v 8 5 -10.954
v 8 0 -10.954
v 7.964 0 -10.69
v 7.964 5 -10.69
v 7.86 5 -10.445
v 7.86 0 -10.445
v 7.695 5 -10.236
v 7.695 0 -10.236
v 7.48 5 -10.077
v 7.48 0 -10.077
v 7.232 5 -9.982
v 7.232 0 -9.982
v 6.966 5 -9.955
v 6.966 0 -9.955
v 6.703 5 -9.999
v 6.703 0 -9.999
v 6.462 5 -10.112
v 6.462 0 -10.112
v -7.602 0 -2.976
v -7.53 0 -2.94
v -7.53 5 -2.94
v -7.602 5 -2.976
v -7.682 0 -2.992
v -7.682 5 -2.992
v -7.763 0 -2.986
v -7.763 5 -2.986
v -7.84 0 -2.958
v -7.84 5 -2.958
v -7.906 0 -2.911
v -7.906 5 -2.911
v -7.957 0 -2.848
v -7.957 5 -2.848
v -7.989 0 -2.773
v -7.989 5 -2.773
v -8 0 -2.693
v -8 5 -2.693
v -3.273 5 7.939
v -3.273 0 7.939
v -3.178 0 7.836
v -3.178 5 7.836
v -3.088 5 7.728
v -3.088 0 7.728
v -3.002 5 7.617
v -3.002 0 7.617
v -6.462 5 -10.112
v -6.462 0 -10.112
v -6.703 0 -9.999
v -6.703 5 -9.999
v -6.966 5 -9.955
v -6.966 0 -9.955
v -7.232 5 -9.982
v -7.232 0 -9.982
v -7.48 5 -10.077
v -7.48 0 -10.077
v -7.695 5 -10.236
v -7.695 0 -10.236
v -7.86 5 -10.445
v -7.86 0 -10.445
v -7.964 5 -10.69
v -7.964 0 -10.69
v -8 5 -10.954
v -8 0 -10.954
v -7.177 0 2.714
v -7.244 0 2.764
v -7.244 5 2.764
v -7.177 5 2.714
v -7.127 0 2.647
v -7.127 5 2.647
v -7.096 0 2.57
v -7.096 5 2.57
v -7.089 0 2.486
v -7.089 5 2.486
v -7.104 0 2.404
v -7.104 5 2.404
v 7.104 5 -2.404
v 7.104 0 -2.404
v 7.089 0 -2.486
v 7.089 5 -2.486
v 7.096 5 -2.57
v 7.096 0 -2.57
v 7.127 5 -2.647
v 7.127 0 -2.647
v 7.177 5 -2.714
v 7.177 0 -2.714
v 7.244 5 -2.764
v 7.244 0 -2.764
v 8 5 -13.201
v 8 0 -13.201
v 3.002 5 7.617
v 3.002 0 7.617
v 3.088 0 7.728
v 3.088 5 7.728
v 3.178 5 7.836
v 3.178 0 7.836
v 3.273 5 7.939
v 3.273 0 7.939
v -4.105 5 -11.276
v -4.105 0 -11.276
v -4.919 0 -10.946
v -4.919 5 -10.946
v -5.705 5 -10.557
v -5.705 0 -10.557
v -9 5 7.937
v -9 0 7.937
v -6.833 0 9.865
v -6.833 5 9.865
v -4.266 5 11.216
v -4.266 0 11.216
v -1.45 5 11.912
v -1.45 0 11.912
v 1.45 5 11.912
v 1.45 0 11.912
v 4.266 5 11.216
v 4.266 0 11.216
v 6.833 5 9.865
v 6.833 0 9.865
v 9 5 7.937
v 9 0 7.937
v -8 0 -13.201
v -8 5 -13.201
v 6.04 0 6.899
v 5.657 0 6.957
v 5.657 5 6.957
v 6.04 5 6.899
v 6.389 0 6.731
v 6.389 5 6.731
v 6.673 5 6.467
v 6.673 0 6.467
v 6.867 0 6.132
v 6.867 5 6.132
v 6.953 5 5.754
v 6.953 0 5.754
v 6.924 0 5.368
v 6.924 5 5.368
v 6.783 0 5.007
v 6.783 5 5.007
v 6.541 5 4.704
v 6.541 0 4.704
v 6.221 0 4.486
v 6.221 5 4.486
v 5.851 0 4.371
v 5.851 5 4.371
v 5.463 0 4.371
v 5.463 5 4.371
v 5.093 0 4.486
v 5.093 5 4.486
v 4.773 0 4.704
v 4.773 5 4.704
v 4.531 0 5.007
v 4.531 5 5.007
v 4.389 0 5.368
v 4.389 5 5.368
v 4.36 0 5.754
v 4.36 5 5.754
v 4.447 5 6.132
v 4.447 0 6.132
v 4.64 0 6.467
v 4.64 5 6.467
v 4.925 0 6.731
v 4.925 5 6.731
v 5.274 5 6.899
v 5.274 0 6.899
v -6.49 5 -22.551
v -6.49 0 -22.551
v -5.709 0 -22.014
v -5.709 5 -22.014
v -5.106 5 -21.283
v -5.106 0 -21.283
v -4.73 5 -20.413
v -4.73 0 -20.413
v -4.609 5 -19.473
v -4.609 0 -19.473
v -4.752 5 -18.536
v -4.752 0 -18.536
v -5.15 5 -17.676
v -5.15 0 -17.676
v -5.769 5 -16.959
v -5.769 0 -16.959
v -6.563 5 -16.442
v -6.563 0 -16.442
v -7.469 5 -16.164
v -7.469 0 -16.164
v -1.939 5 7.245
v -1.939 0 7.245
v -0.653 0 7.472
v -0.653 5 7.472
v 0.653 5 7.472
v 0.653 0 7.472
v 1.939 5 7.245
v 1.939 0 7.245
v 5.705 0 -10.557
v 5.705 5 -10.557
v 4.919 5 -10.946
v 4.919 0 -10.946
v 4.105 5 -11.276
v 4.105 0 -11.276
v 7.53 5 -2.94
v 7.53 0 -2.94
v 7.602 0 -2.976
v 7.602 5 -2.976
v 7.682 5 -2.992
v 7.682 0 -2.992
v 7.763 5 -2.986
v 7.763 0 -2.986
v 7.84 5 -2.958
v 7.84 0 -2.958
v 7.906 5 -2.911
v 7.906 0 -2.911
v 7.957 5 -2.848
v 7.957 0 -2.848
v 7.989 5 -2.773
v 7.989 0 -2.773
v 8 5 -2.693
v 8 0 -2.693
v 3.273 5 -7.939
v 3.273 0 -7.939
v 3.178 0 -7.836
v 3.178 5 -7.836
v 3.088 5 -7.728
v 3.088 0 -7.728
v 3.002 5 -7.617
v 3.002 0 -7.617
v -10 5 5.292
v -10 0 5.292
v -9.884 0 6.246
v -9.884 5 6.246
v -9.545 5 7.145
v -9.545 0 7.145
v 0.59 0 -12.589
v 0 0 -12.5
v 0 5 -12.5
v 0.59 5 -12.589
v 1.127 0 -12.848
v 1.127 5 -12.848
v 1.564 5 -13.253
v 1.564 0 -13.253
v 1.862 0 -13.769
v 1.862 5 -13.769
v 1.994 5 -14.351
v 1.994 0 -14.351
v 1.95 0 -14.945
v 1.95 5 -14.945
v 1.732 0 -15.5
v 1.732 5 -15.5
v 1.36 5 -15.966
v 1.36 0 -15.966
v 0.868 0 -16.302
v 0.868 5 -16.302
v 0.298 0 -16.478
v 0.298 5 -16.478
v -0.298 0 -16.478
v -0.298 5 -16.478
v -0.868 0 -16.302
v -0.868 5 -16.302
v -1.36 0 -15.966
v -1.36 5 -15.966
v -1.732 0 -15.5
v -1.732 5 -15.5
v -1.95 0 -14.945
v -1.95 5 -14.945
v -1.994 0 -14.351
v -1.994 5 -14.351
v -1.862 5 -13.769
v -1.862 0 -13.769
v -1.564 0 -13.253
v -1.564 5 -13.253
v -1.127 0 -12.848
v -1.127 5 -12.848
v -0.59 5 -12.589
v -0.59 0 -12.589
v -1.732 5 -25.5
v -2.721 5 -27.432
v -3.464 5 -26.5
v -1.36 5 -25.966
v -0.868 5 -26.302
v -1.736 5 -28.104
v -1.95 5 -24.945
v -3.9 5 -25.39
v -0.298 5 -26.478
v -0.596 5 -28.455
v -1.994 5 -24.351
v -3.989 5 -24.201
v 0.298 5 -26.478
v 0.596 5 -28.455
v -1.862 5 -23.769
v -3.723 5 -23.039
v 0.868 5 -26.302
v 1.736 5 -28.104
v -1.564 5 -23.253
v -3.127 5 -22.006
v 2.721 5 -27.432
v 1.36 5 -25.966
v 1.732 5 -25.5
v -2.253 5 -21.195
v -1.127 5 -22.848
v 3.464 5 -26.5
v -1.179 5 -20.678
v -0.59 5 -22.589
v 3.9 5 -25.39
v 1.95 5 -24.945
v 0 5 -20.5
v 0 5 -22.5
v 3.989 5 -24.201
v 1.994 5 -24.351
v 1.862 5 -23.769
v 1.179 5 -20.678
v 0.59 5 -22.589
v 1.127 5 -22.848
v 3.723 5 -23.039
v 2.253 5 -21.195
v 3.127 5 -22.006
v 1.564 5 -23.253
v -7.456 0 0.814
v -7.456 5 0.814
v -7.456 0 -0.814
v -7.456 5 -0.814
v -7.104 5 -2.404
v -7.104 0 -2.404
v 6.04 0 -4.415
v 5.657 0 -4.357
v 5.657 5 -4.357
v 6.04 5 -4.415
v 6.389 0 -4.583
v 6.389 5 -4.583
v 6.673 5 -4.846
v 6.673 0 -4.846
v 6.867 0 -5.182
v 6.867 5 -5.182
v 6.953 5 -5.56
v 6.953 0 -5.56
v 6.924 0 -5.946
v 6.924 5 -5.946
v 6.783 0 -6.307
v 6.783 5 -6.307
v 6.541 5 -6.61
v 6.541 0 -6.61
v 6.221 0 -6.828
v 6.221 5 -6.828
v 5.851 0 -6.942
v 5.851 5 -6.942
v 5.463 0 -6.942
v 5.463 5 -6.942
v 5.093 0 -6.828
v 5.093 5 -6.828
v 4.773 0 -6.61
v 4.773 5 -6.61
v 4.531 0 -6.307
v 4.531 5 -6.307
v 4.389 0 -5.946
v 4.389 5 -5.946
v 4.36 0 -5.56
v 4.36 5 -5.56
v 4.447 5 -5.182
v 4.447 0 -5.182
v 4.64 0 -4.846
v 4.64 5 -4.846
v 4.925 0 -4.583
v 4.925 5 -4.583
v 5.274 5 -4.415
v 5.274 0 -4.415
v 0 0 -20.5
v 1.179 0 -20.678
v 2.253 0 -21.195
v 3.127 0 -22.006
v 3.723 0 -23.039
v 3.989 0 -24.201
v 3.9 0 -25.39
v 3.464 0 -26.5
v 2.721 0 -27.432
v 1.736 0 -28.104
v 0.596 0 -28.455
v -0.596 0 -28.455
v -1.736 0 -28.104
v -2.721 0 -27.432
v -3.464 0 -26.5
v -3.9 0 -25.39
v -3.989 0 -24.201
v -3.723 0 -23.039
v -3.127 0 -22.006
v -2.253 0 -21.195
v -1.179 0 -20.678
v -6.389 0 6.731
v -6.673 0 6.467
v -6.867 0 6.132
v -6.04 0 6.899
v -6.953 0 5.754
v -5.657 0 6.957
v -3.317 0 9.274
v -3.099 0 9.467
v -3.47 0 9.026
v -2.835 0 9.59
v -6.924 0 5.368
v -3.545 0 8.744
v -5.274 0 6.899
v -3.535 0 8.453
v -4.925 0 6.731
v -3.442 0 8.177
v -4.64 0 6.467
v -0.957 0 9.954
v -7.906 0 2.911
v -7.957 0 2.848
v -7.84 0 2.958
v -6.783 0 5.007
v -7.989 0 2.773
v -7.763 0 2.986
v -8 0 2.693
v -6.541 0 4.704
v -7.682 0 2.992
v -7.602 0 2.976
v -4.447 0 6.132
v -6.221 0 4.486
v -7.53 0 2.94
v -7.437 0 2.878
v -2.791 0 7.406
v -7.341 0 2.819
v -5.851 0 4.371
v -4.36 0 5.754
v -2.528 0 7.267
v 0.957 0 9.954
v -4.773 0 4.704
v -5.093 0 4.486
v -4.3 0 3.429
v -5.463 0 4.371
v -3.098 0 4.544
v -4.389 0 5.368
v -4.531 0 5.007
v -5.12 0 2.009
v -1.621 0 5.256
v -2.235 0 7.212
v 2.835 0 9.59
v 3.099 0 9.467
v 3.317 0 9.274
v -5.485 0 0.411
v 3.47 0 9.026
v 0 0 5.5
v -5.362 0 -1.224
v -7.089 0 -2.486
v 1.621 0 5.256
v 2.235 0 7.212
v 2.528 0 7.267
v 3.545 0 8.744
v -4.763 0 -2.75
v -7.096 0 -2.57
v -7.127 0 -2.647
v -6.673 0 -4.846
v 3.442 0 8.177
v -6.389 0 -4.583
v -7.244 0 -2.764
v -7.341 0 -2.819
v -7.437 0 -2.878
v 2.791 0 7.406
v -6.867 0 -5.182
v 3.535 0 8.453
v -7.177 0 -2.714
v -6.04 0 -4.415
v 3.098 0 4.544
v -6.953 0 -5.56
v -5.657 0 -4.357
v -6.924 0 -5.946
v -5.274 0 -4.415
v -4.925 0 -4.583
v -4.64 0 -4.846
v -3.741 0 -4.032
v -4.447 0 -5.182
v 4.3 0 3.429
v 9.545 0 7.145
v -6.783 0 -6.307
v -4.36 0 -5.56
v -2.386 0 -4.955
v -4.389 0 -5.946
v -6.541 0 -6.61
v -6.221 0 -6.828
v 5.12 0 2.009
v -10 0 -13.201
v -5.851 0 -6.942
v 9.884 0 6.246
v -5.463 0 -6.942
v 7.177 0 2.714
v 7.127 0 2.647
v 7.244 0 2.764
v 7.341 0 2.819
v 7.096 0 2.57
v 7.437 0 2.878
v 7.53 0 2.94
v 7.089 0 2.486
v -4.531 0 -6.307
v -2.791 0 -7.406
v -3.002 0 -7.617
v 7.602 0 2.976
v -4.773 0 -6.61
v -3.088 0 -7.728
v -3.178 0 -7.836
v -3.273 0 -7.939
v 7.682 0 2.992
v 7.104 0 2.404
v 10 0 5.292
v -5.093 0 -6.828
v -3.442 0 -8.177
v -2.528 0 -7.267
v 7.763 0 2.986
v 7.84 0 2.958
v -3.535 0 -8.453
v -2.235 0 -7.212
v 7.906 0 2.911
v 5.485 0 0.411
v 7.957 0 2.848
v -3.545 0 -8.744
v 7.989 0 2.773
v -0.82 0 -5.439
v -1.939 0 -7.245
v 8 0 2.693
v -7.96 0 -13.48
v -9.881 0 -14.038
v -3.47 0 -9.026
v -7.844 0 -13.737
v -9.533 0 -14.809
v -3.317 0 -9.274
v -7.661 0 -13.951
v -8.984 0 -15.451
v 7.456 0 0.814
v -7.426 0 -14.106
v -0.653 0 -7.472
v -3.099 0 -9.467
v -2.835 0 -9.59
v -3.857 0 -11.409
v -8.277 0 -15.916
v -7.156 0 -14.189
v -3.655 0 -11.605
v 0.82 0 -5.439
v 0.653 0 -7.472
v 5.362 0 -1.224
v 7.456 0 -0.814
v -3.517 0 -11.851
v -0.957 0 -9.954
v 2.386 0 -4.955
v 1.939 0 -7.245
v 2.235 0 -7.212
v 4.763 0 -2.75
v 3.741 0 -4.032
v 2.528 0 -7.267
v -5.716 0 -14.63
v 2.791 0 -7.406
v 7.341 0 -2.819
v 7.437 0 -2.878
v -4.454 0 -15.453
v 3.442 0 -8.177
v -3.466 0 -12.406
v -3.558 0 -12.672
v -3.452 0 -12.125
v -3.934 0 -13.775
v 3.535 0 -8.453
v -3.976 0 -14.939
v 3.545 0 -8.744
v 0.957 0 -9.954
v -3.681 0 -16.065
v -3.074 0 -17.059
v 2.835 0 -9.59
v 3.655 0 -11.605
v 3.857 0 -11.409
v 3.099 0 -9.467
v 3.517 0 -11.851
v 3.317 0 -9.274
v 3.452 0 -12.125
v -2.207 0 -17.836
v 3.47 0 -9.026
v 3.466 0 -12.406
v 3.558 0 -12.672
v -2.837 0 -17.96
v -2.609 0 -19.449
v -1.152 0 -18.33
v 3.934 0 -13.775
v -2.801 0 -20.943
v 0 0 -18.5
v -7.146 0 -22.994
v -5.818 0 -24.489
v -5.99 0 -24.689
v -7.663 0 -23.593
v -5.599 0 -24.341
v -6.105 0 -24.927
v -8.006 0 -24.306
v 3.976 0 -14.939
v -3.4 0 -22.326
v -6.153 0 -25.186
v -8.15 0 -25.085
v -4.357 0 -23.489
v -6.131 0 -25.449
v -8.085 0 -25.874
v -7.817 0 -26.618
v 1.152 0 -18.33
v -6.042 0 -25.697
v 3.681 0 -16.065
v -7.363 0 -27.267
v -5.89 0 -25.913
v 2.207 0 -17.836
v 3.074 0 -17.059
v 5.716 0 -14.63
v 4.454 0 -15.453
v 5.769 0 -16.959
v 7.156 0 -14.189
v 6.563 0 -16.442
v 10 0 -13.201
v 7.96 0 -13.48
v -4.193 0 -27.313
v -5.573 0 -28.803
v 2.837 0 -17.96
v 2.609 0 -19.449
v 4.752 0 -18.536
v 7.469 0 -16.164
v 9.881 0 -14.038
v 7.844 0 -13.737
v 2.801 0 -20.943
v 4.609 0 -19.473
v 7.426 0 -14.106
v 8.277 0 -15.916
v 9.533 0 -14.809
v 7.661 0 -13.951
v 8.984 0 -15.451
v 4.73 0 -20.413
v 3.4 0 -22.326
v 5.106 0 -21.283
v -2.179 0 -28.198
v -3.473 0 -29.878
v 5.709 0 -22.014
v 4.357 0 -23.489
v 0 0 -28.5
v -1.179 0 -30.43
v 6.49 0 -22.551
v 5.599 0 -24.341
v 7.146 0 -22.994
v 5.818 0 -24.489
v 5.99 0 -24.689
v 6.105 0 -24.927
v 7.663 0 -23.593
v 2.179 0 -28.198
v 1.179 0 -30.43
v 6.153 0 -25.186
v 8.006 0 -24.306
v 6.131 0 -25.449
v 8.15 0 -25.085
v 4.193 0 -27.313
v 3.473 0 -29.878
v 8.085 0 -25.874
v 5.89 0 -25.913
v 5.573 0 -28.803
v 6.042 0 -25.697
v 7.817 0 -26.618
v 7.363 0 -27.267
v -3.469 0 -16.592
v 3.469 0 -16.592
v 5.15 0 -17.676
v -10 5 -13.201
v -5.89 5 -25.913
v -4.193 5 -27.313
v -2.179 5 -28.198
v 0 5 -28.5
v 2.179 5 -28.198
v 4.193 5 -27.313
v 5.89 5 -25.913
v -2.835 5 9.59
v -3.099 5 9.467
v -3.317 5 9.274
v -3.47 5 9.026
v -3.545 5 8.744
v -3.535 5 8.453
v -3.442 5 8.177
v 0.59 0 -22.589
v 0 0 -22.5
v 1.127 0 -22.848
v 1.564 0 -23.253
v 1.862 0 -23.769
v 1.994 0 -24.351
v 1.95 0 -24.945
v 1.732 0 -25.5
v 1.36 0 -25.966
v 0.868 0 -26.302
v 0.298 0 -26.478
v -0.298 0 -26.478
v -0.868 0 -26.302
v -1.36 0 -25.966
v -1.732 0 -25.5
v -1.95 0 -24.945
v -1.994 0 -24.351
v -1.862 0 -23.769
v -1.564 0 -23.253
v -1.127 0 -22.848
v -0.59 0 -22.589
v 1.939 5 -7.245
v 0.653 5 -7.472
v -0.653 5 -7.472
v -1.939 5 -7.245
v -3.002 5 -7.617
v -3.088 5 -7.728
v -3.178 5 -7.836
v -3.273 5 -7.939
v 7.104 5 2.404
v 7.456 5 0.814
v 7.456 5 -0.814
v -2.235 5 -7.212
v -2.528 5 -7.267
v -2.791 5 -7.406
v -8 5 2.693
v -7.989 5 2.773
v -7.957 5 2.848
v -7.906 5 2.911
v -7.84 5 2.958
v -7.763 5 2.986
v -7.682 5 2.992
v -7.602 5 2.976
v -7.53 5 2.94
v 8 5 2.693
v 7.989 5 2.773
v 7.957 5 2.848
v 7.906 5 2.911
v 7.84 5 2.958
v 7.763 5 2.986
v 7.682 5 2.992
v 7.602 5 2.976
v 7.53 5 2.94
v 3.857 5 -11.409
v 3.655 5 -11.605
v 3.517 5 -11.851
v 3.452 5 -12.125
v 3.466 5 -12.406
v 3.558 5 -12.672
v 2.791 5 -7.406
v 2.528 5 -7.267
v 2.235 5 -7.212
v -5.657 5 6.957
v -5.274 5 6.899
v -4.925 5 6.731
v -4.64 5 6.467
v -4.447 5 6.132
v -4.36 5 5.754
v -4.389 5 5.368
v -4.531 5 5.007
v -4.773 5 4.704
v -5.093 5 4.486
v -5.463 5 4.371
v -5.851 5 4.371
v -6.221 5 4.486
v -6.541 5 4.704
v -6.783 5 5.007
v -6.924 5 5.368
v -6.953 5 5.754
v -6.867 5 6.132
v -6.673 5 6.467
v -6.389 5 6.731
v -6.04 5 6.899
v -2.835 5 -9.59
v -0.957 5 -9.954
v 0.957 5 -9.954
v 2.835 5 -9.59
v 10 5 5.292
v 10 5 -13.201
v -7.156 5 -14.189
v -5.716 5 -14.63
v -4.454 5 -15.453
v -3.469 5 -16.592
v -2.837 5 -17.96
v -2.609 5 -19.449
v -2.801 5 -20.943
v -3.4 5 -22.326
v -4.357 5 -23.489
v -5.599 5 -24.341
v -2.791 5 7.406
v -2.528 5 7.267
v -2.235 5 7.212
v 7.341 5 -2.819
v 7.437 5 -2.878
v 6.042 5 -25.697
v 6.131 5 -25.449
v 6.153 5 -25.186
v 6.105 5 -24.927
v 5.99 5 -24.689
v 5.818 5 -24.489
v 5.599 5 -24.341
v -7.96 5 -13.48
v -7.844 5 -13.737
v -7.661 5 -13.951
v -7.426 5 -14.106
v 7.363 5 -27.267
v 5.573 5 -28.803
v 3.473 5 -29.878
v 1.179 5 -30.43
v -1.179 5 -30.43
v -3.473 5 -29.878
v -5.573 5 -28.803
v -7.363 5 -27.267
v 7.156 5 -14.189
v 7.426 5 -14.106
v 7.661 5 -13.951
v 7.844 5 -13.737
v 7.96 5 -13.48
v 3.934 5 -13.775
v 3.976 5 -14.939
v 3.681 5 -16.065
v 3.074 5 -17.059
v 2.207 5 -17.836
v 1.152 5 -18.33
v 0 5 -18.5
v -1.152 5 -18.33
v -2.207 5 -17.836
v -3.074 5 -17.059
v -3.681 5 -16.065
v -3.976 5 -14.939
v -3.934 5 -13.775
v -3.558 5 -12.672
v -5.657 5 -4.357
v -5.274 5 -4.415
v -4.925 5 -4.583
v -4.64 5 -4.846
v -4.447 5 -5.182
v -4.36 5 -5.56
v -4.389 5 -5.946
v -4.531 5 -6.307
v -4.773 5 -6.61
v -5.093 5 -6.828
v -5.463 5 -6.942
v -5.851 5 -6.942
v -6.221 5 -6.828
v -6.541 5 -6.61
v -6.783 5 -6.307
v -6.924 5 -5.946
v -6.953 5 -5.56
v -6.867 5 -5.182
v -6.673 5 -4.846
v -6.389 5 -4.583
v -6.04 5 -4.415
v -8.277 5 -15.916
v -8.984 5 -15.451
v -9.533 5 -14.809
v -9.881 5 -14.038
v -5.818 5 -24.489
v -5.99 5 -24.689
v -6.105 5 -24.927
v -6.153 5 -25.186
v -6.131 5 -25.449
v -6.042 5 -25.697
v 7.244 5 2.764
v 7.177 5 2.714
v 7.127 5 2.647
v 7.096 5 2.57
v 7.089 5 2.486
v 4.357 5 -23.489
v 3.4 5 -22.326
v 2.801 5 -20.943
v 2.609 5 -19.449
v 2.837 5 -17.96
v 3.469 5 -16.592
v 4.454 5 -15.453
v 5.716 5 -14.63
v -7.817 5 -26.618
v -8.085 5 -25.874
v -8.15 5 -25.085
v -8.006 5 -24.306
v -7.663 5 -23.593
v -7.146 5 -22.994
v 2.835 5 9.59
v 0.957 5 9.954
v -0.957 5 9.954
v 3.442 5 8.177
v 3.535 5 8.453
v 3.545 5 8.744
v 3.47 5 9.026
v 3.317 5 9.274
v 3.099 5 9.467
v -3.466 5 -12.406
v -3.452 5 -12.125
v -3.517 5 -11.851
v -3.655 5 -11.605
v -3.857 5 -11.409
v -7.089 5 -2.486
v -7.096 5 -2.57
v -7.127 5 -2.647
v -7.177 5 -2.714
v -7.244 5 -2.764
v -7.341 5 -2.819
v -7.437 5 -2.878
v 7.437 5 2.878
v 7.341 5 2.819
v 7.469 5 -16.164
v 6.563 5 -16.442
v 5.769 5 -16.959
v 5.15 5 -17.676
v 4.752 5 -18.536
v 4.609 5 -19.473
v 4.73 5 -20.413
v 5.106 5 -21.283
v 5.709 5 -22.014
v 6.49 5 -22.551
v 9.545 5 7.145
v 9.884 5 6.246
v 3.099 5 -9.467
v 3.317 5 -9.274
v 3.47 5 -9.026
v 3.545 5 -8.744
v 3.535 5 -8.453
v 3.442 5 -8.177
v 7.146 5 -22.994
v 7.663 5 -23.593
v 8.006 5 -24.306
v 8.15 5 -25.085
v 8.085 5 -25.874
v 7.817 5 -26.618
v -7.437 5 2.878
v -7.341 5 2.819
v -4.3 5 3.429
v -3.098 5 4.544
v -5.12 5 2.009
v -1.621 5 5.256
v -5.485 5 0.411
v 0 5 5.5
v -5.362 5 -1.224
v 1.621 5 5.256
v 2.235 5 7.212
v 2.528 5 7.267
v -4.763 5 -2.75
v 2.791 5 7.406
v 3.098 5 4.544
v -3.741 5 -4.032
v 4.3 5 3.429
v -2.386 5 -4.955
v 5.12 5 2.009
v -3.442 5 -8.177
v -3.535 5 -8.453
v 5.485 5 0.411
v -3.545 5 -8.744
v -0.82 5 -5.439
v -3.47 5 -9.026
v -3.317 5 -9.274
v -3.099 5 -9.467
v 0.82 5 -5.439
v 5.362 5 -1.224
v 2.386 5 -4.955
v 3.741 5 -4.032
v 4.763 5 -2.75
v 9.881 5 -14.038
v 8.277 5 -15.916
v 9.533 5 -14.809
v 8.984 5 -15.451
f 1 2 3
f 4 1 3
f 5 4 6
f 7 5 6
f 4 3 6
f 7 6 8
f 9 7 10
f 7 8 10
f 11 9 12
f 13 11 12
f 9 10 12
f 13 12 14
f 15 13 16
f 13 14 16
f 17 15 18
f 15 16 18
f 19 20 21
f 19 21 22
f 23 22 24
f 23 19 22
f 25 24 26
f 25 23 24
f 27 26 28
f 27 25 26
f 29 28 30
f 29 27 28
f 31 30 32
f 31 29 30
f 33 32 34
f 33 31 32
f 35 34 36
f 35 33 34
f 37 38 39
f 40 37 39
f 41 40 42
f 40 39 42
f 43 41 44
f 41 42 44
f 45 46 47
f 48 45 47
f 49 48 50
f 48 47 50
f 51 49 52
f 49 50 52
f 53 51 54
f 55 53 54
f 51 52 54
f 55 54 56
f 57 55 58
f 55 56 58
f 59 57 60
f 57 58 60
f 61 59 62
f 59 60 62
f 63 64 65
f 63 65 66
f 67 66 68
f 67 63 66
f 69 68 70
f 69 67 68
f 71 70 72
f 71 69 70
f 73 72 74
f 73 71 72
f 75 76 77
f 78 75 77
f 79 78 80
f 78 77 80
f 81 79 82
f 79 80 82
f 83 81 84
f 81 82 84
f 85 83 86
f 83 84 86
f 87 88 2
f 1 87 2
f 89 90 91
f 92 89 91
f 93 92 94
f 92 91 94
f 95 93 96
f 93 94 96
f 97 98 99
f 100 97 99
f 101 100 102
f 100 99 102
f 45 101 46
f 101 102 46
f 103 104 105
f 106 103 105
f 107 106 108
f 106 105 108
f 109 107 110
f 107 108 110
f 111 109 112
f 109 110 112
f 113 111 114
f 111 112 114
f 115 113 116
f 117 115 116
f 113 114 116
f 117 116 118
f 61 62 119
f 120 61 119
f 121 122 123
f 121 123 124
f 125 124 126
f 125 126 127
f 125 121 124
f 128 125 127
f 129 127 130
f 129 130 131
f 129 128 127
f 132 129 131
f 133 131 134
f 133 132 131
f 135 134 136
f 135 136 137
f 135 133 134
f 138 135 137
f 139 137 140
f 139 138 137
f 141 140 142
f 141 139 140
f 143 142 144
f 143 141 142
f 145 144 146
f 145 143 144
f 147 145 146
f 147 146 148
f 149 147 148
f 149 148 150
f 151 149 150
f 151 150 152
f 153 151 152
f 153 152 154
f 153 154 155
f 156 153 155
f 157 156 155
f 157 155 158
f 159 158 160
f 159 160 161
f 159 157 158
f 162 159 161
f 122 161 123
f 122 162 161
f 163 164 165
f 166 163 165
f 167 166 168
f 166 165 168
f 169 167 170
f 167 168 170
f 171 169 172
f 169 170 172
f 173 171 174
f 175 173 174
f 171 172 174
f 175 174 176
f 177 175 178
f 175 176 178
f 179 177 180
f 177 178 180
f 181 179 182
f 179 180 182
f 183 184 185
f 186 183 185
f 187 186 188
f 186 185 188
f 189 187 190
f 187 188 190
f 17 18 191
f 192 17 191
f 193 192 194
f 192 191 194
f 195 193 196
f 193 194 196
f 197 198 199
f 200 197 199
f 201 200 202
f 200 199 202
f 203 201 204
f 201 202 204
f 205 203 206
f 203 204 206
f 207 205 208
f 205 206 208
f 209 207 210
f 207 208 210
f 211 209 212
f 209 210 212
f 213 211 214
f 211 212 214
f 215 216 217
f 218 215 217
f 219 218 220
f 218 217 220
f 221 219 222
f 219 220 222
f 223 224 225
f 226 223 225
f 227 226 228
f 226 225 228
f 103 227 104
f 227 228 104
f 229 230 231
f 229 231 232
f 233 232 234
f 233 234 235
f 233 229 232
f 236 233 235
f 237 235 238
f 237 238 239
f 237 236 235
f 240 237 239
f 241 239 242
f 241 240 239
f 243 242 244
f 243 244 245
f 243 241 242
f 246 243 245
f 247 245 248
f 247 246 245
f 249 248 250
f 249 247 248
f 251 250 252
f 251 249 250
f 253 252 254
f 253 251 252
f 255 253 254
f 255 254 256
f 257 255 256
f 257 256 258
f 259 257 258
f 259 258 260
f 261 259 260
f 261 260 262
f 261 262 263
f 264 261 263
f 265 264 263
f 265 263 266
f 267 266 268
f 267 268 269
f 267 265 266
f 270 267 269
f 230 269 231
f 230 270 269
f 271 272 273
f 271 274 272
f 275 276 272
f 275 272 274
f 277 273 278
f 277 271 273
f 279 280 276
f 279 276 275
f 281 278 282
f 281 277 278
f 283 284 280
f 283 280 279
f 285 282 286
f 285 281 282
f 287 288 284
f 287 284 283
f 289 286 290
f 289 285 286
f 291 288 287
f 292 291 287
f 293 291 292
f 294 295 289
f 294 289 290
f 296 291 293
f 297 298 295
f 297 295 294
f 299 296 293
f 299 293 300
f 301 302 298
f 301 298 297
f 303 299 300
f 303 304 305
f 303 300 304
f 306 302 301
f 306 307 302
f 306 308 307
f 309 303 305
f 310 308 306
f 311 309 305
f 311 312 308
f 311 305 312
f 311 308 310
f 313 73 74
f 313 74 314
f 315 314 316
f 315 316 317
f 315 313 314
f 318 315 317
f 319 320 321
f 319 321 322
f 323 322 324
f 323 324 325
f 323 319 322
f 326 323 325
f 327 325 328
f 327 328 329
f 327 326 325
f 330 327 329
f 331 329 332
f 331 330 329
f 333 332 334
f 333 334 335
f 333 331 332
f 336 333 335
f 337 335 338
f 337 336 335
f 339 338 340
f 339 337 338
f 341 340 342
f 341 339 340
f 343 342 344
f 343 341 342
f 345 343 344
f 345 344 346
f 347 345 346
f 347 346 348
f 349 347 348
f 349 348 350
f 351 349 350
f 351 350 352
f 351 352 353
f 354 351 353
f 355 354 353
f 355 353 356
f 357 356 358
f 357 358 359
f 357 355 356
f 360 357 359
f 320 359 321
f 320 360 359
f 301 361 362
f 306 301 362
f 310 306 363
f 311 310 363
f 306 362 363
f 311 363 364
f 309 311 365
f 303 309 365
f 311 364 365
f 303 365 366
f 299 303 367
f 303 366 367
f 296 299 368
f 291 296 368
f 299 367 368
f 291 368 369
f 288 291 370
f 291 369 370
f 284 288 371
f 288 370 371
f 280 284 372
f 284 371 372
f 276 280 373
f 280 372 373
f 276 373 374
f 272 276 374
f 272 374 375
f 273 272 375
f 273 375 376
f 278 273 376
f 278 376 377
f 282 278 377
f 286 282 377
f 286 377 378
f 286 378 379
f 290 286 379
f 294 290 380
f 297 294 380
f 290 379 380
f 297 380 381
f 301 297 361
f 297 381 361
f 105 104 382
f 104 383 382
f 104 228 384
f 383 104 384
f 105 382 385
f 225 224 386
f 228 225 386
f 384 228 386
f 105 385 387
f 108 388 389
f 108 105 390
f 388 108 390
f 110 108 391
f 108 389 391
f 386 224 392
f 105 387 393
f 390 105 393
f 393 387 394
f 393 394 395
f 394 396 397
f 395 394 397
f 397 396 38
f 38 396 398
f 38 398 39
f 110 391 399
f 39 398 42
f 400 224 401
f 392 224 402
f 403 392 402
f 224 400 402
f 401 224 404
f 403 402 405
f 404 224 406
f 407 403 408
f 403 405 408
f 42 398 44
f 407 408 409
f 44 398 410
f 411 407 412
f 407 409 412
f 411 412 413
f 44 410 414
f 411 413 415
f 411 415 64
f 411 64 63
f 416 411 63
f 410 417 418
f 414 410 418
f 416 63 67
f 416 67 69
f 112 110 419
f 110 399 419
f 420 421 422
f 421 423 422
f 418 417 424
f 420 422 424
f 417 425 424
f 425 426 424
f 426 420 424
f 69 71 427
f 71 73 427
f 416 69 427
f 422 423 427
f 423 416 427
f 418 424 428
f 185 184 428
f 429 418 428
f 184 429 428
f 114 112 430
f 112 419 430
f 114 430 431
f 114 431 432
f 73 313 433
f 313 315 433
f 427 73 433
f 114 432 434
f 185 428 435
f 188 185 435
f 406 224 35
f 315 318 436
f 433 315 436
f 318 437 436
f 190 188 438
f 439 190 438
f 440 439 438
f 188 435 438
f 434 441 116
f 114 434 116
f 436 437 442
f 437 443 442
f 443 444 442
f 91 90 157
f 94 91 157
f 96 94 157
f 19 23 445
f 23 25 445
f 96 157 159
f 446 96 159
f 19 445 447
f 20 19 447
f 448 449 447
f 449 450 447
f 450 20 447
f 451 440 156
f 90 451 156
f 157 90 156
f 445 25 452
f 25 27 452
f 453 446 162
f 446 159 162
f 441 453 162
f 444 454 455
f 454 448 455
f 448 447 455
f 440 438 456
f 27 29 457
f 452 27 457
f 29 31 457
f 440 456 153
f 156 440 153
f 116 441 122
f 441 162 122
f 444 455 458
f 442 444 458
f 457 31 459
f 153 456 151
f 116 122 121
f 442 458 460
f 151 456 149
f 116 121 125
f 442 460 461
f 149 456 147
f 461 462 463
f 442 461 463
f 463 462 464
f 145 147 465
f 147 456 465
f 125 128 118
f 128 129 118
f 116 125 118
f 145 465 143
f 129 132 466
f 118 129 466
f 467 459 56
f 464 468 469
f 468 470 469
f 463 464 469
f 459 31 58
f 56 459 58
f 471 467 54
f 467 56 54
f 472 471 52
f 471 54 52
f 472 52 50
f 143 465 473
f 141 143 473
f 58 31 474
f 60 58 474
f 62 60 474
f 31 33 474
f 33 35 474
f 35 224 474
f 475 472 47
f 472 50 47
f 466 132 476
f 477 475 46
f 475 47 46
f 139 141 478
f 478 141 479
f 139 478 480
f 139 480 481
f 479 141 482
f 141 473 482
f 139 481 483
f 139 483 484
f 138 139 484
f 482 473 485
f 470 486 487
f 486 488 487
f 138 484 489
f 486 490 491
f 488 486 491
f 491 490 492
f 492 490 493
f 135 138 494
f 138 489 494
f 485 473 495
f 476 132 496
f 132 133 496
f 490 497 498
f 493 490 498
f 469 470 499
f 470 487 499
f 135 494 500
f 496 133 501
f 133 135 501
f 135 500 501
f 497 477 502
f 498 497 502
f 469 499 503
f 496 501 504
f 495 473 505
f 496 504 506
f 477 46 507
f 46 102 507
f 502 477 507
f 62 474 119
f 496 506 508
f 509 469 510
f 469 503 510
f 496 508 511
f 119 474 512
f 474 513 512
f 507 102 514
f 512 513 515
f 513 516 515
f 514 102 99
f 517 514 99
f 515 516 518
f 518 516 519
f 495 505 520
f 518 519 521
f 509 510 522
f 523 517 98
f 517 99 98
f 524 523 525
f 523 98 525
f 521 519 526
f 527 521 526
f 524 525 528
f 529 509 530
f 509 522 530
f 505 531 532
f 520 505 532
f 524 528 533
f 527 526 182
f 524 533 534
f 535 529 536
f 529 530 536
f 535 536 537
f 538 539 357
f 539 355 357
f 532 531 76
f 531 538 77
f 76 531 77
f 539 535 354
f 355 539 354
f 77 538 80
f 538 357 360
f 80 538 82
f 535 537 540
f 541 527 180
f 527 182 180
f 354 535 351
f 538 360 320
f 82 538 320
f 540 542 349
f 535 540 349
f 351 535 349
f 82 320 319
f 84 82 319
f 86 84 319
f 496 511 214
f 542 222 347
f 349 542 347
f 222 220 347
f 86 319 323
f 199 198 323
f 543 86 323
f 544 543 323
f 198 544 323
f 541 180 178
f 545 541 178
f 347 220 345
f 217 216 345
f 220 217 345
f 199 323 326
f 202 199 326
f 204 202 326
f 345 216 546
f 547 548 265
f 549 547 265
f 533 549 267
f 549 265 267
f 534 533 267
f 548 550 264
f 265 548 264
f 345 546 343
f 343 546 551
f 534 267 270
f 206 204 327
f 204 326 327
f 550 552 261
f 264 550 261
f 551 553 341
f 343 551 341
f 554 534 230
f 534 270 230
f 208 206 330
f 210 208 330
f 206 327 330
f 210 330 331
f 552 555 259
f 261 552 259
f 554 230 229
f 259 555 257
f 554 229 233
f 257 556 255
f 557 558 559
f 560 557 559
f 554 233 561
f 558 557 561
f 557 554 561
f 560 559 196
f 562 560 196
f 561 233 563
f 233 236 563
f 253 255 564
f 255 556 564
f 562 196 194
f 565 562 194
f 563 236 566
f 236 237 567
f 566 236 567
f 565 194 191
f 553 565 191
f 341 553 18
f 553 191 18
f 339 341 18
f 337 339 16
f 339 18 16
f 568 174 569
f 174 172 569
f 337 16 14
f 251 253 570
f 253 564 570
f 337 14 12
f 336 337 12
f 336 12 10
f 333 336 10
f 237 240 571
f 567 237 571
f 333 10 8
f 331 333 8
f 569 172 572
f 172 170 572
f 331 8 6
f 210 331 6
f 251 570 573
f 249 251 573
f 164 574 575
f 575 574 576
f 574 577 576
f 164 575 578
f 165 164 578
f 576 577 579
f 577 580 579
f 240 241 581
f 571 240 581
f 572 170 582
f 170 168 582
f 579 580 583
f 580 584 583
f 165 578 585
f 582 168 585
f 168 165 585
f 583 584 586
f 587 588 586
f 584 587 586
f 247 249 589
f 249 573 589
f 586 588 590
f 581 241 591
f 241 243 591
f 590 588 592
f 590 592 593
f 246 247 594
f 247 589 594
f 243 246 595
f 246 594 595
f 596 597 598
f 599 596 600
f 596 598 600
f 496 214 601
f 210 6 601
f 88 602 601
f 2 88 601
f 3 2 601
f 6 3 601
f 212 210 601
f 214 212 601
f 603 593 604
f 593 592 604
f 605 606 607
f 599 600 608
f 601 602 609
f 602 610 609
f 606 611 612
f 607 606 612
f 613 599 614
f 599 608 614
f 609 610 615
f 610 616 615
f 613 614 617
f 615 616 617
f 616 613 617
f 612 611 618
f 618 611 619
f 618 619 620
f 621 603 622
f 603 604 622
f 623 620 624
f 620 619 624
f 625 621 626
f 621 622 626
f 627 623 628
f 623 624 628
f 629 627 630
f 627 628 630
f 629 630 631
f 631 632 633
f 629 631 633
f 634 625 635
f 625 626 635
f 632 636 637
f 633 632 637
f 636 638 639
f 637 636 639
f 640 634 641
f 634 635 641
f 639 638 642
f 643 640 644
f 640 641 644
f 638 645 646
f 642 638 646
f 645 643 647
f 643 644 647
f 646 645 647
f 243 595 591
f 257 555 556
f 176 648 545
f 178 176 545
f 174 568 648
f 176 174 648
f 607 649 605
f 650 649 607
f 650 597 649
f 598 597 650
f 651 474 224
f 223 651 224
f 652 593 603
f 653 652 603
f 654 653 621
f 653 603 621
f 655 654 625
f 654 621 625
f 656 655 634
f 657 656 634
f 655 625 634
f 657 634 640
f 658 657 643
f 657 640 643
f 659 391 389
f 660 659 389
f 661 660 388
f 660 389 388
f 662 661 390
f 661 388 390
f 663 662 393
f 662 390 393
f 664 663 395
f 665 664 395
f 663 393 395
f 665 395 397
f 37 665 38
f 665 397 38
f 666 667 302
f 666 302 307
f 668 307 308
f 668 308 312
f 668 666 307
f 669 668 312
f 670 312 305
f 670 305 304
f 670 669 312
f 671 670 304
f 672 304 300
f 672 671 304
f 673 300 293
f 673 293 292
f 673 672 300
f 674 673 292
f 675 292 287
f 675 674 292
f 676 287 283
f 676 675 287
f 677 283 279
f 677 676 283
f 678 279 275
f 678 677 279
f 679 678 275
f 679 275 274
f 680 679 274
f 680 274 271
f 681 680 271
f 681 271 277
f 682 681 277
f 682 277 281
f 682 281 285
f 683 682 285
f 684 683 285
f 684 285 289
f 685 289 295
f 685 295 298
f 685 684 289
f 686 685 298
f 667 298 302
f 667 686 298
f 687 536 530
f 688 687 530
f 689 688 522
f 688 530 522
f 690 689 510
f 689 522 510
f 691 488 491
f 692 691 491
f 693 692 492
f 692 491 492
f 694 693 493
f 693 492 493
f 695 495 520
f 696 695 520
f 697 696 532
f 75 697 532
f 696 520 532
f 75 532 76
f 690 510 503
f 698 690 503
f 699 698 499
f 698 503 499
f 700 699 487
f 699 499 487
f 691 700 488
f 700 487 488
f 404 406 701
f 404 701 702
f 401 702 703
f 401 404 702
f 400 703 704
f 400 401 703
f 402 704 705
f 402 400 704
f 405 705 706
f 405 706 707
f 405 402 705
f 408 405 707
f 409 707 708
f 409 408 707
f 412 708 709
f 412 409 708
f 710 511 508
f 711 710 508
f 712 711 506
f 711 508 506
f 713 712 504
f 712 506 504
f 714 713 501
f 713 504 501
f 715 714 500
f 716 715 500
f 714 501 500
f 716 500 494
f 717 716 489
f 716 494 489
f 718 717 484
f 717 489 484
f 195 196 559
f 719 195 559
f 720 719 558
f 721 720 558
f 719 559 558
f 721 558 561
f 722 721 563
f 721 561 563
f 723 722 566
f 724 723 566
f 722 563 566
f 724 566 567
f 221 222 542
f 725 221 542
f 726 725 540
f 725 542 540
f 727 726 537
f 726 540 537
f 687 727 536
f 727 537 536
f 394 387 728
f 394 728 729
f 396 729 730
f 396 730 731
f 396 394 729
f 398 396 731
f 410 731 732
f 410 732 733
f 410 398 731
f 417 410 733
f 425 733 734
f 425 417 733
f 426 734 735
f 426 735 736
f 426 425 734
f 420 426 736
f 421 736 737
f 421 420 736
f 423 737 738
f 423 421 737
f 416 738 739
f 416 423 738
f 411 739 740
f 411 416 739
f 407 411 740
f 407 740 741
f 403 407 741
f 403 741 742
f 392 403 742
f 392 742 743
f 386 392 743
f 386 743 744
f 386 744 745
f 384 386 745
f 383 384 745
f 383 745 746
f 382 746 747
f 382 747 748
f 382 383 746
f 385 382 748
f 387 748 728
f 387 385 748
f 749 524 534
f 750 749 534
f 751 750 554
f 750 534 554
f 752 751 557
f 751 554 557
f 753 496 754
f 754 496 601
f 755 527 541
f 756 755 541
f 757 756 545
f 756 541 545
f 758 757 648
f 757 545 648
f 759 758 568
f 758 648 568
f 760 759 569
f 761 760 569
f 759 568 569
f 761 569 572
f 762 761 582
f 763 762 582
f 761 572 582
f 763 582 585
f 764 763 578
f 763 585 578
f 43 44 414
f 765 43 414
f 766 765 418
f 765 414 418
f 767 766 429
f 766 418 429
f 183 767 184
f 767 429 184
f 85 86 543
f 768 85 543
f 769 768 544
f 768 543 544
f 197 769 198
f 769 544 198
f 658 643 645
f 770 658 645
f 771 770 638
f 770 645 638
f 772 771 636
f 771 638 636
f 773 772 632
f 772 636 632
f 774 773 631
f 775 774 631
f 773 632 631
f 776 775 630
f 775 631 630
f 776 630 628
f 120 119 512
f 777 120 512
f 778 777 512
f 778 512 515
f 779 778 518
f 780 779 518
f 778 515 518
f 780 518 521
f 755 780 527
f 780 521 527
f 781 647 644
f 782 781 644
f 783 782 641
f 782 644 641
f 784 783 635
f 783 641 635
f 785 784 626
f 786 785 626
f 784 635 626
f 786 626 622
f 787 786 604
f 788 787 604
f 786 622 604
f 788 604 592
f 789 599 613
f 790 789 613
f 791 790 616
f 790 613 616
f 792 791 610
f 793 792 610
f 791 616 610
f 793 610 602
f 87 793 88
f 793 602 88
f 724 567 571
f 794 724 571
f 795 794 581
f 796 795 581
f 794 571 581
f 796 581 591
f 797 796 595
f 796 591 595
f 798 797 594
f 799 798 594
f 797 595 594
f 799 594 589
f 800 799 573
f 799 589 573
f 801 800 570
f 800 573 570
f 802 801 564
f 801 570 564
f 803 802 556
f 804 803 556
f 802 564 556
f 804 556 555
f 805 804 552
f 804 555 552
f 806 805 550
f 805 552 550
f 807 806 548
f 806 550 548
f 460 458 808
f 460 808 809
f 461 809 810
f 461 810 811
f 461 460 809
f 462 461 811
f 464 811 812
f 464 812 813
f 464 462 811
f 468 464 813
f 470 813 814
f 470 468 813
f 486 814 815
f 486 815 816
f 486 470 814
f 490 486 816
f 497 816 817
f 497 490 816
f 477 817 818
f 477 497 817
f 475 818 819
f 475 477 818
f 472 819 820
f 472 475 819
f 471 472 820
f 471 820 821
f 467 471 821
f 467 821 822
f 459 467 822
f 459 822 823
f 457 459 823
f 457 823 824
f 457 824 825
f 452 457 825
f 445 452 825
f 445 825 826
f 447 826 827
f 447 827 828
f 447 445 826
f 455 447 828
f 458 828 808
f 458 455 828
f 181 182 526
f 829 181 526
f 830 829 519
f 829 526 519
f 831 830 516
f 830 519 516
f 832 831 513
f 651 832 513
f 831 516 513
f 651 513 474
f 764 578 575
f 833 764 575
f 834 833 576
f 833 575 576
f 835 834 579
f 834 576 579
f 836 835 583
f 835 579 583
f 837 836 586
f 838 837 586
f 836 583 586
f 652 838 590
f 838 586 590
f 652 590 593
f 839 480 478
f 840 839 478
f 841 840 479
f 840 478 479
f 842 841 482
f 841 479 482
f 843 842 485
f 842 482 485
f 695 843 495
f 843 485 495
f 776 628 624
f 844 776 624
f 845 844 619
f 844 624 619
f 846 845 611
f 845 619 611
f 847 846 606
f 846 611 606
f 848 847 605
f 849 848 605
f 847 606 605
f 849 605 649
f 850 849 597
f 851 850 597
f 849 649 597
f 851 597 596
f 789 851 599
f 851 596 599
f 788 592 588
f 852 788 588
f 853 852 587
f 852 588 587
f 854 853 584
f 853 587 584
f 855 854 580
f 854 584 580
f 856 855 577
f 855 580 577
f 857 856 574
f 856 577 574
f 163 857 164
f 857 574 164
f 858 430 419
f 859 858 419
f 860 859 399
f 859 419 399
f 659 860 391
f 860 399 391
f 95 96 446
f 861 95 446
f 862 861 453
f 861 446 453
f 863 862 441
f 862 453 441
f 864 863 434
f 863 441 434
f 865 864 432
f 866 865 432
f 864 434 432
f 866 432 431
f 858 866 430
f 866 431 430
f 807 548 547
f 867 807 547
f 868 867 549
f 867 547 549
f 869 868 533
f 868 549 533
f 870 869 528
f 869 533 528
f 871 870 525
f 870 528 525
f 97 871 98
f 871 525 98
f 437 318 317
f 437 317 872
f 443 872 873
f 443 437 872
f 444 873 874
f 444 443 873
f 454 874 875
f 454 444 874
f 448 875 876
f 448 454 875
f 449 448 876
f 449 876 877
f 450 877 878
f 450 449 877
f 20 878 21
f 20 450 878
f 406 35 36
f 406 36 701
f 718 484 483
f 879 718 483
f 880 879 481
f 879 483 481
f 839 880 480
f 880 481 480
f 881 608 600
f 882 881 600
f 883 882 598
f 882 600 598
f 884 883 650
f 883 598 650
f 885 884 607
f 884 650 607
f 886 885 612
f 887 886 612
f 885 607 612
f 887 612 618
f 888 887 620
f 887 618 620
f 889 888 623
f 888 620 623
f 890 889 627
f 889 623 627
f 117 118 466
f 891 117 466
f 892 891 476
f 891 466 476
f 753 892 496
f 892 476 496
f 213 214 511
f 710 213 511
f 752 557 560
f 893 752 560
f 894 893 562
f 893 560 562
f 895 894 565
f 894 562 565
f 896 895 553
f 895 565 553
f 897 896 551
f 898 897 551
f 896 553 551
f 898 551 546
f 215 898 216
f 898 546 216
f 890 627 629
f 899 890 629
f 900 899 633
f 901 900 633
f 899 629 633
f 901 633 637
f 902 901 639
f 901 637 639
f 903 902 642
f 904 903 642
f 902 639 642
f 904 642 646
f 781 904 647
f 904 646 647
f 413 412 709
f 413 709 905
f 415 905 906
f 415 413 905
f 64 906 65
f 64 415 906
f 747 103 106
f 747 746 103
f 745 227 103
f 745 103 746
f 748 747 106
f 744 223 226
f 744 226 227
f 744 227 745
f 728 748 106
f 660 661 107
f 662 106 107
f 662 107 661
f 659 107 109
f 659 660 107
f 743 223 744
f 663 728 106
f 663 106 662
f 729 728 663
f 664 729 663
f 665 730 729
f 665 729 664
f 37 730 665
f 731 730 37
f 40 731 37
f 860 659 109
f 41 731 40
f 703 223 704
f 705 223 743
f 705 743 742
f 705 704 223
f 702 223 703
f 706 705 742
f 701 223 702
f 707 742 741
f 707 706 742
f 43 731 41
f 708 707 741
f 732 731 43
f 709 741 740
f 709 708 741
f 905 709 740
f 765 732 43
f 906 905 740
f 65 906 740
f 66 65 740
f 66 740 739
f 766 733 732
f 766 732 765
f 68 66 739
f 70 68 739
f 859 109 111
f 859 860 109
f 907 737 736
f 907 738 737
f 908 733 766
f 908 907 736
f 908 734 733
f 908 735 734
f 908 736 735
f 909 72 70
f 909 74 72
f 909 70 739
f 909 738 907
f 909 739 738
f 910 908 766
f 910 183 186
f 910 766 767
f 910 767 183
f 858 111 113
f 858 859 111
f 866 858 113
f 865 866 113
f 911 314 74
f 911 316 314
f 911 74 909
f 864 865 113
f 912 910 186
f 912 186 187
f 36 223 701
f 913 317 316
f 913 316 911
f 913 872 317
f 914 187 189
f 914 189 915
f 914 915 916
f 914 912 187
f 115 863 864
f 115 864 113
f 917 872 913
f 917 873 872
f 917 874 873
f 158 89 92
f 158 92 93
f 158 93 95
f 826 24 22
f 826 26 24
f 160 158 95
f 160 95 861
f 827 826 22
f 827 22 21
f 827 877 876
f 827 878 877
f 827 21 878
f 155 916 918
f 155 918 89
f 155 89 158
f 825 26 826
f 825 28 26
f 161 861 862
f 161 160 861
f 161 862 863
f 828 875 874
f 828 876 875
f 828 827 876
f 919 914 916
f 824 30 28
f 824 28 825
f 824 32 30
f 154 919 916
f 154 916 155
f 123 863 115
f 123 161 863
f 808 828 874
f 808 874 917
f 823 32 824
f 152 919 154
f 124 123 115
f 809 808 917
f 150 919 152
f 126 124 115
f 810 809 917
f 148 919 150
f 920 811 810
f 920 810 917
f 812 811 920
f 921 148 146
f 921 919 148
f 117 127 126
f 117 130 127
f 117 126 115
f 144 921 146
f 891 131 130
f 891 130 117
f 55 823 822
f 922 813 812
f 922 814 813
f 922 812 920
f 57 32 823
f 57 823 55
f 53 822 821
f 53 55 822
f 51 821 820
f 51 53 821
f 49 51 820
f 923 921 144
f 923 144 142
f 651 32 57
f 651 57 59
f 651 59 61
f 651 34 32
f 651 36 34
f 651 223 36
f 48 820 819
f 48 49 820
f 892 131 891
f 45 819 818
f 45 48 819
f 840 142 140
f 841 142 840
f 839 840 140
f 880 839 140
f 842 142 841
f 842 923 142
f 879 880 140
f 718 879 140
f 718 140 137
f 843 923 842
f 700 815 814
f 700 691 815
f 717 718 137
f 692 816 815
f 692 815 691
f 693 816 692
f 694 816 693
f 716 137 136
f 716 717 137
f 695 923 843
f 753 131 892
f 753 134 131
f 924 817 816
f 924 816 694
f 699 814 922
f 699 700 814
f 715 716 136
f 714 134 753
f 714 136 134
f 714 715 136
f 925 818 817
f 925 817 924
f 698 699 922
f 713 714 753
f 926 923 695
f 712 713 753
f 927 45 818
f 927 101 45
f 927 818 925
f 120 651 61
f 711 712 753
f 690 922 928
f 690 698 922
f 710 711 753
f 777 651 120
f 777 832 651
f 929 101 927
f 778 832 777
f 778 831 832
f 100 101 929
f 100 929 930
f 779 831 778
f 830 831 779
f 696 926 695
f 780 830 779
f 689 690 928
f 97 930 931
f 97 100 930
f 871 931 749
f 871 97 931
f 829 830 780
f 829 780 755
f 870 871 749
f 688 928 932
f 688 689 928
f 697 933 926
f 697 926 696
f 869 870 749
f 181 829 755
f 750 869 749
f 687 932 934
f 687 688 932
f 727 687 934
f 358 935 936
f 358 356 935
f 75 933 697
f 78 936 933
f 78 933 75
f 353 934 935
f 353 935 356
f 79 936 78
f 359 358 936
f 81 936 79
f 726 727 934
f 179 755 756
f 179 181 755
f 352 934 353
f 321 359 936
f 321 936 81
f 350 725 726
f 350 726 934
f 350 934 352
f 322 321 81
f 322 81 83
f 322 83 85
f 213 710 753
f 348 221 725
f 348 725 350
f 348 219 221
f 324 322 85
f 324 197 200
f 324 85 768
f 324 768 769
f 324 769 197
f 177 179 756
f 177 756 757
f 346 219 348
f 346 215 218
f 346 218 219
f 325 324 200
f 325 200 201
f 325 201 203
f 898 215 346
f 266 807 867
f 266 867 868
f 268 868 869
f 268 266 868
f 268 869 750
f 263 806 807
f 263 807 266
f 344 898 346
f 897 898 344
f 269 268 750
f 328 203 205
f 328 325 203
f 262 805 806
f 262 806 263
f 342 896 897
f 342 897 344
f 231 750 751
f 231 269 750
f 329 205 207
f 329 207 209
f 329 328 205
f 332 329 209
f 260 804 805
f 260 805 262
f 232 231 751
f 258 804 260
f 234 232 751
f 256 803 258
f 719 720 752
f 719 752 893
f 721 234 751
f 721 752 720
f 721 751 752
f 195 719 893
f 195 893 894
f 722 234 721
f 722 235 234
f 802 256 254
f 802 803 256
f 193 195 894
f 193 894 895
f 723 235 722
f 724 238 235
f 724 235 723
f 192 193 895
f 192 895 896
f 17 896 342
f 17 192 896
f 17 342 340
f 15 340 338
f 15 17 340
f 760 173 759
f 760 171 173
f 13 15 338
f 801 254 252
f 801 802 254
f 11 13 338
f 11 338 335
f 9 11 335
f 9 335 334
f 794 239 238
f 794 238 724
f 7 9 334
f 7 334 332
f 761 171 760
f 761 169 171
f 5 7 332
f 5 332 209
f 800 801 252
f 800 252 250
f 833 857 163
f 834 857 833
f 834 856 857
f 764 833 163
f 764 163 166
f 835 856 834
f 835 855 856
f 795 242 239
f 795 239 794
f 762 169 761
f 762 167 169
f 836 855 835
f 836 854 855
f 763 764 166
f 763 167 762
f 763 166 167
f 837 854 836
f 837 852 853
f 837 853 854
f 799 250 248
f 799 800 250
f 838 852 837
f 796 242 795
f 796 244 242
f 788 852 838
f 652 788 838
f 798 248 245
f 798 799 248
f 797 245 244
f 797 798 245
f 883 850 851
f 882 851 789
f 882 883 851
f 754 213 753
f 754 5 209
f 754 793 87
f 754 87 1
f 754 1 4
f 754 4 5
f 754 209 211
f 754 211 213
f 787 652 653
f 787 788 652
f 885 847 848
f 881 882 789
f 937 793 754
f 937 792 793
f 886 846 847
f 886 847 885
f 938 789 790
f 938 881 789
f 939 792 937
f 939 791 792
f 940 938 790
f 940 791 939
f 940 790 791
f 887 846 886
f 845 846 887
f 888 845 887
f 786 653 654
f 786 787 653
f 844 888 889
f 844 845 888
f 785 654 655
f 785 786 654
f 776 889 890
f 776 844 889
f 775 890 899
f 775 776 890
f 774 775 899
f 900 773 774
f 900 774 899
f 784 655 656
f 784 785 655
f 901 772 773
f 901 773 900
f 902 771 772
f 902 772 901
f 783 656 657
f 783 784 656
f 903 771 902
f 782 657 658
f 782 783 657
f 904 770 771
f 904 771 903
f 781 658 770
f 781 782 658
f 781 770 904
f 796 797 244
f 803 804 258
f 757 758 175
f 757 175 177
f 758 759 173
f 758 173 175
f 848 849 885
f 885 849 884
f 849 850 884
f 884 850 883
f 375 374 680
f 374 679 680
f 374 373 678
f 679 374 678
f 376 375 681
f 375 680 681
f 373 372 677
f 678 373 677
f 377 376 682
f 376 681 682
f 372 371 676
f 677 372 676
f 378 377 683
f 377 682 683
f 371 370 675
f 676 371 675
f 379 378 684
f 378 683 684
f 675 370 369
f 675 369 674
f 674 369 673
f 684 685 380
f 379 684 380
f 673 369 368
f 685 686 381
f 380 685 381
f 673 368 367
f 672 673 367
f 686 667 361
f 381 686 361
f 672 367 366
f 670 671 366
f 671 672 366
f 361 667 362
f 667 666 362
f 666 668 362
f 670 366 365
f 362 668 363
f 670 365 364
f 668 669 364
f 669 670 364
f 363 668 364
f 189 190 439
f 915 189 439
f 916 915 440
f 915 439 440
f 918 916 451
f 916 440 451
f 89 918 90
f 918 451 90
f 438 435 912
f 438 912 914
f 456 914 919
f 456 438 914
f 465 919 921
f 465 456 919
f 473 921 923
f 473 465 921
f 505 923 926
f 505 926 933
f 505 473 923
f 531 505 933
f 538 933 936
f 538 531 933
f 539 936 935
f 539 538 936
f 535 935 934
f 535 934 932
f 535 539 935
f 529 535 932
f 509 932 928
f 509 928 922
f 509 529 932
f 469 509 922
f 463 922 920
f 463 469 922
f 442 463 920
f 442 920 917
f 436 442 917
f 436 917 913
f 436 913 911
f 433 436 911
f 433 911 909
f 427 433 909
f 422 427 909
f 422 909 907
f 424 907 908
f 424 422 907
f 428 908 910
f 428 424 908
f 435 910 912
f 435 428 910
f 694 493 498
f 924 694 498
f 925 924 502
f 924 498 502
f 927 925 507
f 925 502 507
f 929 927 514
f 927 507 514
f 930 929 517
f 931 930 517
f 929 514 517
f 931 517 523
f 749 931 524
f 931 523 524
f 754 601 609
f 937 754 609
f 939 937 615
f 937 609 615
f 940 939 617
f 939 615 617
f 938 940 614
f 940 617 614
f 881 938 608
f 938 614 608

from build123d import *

# Parameters (mm, degrees)
SKETCH1_R             = 4
SKETCH1_R_2           = 2
BOSS_EXTRUDE1_DEPTH   = 5
SKETCH1_R_3           = 5.5
SKETCH1_R_4           = 1.3
BOSS_EXTRUDE1_2_DEPTH = 5


with BuildPart() as part:
    # Sketch1 → Boss-Extrude1 (new body)
    with BuildSketch(Plane(origin=(0, 0, 0), x_dir=(1, 0, 0), z_dir=(0, 1, 0))):
        with Locations(Location((0, 24.5, 0), (0, 0, 270))):
            Circle(SKETCH1_R)
        with Locations(Location((0, 24.5, 0), (0, 0, 270))):
            Circle(SKETCH1_R_2, mode=Mode.SUBTRACT)
    extrude(amount=BOSS_EXTRUDE1_DEPTH)


with BuildPart() as body_2:
    # Sketch1 → Boss-Extrude1 2 (new body)
    with BuildSketch(Plane(origin=(0, 0, 0), x_dir=(1, 0, 0), z_dir=(0, 1, 0))):
        with BuildLine():
            Line((-10, 13.201177736), (-10, -5.291502622))
            ThreePointArc((-10, -5.291502622), (-9.741657387, -6.705716185), (-9, -7.937253933))
            ThreePointArc((-9, -7.937253933), (0, -12), (9, -7.937253933))
            ThreePointArc((9, -7.937253933), (9.741657387, -6.705716185), (10, -5.291502622))
            Line((10, -5.291502622), (10, 13.201177736))
            ThreePointArc((10, 13.201177736), (9.281240934, 15.149494908), (7.469373465, 16.164231659))
            ThreePointArc((7.469373465, 16.164231659), (4.647707204, 18.999766552), (6.489782006, 22.550656446))
            ThreePointArc((6.489782006, 22.550656446), (8.103792448, 24.690809454), (7.362709409, 27.266868564))
            ThreePointArc((7.362709409, 27.266868564), (0, 30.5), (-7.362709409, 27.266868564))
            ThreePointArc((-7.362709409, 27.266868564), (-8.103792448, 24.690809454), (-6.489782006, 22.550656446))
            ThreePointArc((-6.489782006, 22.550656446), (-4.647707204, 18.999766552), (-7.469373465, 16.164231659))
            ThreePointArc((-7.469373465, 16.164231659), (-9.281240934, 15.149494908), (-10, 13.201177736))
        make_face()
        with Locations(Location((0, 0, 0), (0, 0, 270))):
            Circle(SKETCH1_R_3, mode=Mode.SUBTRACT)
        with Locations(Location((0, 14.5, 0), (0, 0, 270))):
            Circle(SKETCH1_R_2, mode=Mode.SUBTRACT)
        with Locations(Location((5.656854249, -5.656854249, 0), (0, 0, 270))):
            Circle(SKETCH1_R_4, mode=Mode.SUBTRACT)
        with Locations(Location((-5.656854249, -5.656854249, 0), (0, 0, 270))):
            Circle(SKETCH1_R_4, mode=Mode.SUBTRACT)
        with Locations(Location((-5.656854249, 5.656854249, 0), (0, 0, 270))):
            Circle(SKETCH1_R_4, mode=Mode.SUBTRACT)
        with Locations(Location((5.656854249, 5.656854249, 0), (0, 0, 270))):
            Circle(SKETCH1_R_4, mode=Mode.SUBTRACT)
        with BuildLine():
            Line((8, 13.201177736), (8, 10.95445115))
            ThreePointArc((8, 10.95445115), (7.480384461, 10.077393131), (6.461538462, 10.111801062))
            ThreePointArc((6.461538462, 10.111801062), (5.315468848, 10.758521782), (4.105476172, 11.275862069))
            ThreePointArc((4.105476172, 11.275862069), (3.516564704, 11.850586026), (3.558079349, 12.672413793))
            ThreePointArc((3.558079349, 12.672413793), (0, 18.5), (-3.558079349, 12.672413793))
            ThreePointArc((-3.558079349, 12.672413793), (-3.516564704, 11.850586026), (-4.105476172, 11.275862069))
            ThreePointArc((-4.105476172, 11.275862069), (-5.315468848, 10.758521782), (-6.461538462, 10.111801062))
            ThreePointArc((-6.461538462, 10.111801062), (-7.480384461, 10.077393131), (-8, 10.95445115))
            Line((-8, 10.95445115), (-8, 13.201177736))
            ThreePointArc((-8, 13.201177736), (-7.760413645, 13.850616793), (-7.156457822, 14.188862377))
            ThreePointArc((-7.156457822, 14.188862377), (-2.670827449, 18.69653985), (-5.599191726, 24.341424145))
            ThreePointArc((-5.599191726, 24.341424145), (-6.137195207, 25.054808481), (-5.890167527, 25.913494851))
            ThreePointArc((-5.890167527, 25.913494851), (0, 28.5), (5.890167527, 25.913494851))
            ThreePointArc((5.890167527, 25.913494851), (6.137195207, 25.054808481), (5.599191726, 24.341424145))
            ThreePointArc((5.599191726, 24.341424145), (2.670827449, 18.69653985), (7.156457822, 14.188862377))
            ThreePointArc((7.156457822, 14.188862377), (7.760413645, 13.850616793), (8, 13.201177736))
        make_face(mode=Mode.SUBTRACT)
        with BuildLine():
            Line((-8, 2.692810484), (-8, -2.692810484))
            ThreePointArc((-8, -2.692810484), (-7.839501534, -2.958402882), (-7.529737854, -2.939814131))
            ThreePointArc((-7.529737854, -2.939814131), (-7.389121197, -2.848073158), (-7.244020458, -2.76360289))
            ThreePointArc((-7.244020458, -2.76360289), (-7.108756707, -2.609441922), (-7.104142592, -2.404403884))
            ThreePointArc((-7.104142592, -2.404403884), (-7.5, 0), (-7.104142592, 2.404403884))
            ThreePointArc((-7.104142592, 2.404403884), (-7.108756707, 2.609441922), (-7.244020458, 2.76360289))
            ThreePointArc((-7.244020458, 2.76360289), (-7.389121197, 2.848073158), (-7.529737854, 2.939814131))
            ThreePointArc((-7.529737854, 2.939814131), (-7.839501534, 2.958402882), (-8, 2.692810484))
        make_face(mode=Mode.SUBTRACT)
        with BuildLine():
            Line((8, 2.692810484), (8, -2.692810484))
            ThreePointArc((8, -2.692810484), (7.839501534, -2.958402882), (7.529737854, -2.939814131))
            ThreePointArc((7.529737854, -2.939814131), (7.389121197, -2.848073158), (7.244020458, -2.76360289))
            ThreePointArc((7.244020458, -2.76360289), (7.108756707, -2.609441922), (7.104142592, -2.404403884))
            ThreePointArc((7.104142592, -2.404403884), (7.5, 0), (7.104142592, 2.404403884))
            ThreePointArc((7.104142592, 2.404403884), (7.108756707, 2.609441922), (7.244020458, 2.76360289))
            ThreePointArc((7.244020458, 2.76360289), (7.389121197, 2.848073158), (7.529737854, 2.939814131))
            ThreePointArc((7.529737854, 2.939814131), (7.839501534, 2.958402882), (8, 2.692810484))
        make_face(mode=Mode.SUBTRACT)
        with BuildLine():
            ThreePointArc((1.939070625, -7.244998628), (2.52792956, -7.267128105), (3.002087997, -7.617011422))
            ThreePointArc((3.002087997, -7.617011422), (3.132604397, -7.782451268), (3.273413635, -7.939223816))
            ThreePointArc((3.273413635, -7.939223816), (3.517593283, -8.887764544), (2.834621004, -9.589834397))
            ThreePointArc((2.834621004, -9.589834397), (0, -10), (-2.834621004, -9.589834397))
            ThreePointArc((-2.834621004, -9.589834397), (-3.517593283, -8.887764544), (-3.273413635, -7.939223816))
            ThreePointArc((-3.273413635, -7.939223816), (-3.132604397, -7.782451268), (-3.002087997, -7.617011422))
            ThreePointArc((-3.002087997, -7.617011422), (-2.52792956, -7.267128105), (-1.939070625, -7.244998628))
            ThreePointArc((-1.939070625, -7.244998628), (0, -7.5), (1.939070625, -7.244998628))
        make_face(mode=Mode.SUBTRACT)
        with BuildLine():
            ThreePointArc((1.939070625, 7.244998628), (0, 7.5), (-1.939070625, 7.244998628))
            ThreePointArc((-1.939070625, 7.244998628), (-2.52792956, 7.267128105), (-3.002087997, 7.617011422))
            ThreePointArc((-3.002087997, 7.617011422), (-3.132604397, 7.782451268), (-3.273413635, 7.939223816))
            ThreePointArc((-3.273413635, 7.939223816), (-3.517593283, 8.887764544), (-2.834621004, 9.589834397))
            ThreePointArc((-2.834621004, 9.589834397), (0, 10), (2.834621004, 9.589834397))
            ThreePointArc((2.834621004, 9.589834397), (3.517593283, 8.887764544), (3.273413635, 7.939223816))
            ThreePointArc((3.273413635, 7.939223816), (3.132604397, 7.782451268), (3.002087997, 7.617011422))
            ThreePointArc((3.002087997, 7.617011422), (2.52792956, 7.267128105), (1.939070625, 7.244998628))
        make_face(mode=Mode.SUBTRACT)
    extrude(amount=BOSS_EXTRUDE1_2_DEPTH)


solid = Compound([part.part, body_2.part])
